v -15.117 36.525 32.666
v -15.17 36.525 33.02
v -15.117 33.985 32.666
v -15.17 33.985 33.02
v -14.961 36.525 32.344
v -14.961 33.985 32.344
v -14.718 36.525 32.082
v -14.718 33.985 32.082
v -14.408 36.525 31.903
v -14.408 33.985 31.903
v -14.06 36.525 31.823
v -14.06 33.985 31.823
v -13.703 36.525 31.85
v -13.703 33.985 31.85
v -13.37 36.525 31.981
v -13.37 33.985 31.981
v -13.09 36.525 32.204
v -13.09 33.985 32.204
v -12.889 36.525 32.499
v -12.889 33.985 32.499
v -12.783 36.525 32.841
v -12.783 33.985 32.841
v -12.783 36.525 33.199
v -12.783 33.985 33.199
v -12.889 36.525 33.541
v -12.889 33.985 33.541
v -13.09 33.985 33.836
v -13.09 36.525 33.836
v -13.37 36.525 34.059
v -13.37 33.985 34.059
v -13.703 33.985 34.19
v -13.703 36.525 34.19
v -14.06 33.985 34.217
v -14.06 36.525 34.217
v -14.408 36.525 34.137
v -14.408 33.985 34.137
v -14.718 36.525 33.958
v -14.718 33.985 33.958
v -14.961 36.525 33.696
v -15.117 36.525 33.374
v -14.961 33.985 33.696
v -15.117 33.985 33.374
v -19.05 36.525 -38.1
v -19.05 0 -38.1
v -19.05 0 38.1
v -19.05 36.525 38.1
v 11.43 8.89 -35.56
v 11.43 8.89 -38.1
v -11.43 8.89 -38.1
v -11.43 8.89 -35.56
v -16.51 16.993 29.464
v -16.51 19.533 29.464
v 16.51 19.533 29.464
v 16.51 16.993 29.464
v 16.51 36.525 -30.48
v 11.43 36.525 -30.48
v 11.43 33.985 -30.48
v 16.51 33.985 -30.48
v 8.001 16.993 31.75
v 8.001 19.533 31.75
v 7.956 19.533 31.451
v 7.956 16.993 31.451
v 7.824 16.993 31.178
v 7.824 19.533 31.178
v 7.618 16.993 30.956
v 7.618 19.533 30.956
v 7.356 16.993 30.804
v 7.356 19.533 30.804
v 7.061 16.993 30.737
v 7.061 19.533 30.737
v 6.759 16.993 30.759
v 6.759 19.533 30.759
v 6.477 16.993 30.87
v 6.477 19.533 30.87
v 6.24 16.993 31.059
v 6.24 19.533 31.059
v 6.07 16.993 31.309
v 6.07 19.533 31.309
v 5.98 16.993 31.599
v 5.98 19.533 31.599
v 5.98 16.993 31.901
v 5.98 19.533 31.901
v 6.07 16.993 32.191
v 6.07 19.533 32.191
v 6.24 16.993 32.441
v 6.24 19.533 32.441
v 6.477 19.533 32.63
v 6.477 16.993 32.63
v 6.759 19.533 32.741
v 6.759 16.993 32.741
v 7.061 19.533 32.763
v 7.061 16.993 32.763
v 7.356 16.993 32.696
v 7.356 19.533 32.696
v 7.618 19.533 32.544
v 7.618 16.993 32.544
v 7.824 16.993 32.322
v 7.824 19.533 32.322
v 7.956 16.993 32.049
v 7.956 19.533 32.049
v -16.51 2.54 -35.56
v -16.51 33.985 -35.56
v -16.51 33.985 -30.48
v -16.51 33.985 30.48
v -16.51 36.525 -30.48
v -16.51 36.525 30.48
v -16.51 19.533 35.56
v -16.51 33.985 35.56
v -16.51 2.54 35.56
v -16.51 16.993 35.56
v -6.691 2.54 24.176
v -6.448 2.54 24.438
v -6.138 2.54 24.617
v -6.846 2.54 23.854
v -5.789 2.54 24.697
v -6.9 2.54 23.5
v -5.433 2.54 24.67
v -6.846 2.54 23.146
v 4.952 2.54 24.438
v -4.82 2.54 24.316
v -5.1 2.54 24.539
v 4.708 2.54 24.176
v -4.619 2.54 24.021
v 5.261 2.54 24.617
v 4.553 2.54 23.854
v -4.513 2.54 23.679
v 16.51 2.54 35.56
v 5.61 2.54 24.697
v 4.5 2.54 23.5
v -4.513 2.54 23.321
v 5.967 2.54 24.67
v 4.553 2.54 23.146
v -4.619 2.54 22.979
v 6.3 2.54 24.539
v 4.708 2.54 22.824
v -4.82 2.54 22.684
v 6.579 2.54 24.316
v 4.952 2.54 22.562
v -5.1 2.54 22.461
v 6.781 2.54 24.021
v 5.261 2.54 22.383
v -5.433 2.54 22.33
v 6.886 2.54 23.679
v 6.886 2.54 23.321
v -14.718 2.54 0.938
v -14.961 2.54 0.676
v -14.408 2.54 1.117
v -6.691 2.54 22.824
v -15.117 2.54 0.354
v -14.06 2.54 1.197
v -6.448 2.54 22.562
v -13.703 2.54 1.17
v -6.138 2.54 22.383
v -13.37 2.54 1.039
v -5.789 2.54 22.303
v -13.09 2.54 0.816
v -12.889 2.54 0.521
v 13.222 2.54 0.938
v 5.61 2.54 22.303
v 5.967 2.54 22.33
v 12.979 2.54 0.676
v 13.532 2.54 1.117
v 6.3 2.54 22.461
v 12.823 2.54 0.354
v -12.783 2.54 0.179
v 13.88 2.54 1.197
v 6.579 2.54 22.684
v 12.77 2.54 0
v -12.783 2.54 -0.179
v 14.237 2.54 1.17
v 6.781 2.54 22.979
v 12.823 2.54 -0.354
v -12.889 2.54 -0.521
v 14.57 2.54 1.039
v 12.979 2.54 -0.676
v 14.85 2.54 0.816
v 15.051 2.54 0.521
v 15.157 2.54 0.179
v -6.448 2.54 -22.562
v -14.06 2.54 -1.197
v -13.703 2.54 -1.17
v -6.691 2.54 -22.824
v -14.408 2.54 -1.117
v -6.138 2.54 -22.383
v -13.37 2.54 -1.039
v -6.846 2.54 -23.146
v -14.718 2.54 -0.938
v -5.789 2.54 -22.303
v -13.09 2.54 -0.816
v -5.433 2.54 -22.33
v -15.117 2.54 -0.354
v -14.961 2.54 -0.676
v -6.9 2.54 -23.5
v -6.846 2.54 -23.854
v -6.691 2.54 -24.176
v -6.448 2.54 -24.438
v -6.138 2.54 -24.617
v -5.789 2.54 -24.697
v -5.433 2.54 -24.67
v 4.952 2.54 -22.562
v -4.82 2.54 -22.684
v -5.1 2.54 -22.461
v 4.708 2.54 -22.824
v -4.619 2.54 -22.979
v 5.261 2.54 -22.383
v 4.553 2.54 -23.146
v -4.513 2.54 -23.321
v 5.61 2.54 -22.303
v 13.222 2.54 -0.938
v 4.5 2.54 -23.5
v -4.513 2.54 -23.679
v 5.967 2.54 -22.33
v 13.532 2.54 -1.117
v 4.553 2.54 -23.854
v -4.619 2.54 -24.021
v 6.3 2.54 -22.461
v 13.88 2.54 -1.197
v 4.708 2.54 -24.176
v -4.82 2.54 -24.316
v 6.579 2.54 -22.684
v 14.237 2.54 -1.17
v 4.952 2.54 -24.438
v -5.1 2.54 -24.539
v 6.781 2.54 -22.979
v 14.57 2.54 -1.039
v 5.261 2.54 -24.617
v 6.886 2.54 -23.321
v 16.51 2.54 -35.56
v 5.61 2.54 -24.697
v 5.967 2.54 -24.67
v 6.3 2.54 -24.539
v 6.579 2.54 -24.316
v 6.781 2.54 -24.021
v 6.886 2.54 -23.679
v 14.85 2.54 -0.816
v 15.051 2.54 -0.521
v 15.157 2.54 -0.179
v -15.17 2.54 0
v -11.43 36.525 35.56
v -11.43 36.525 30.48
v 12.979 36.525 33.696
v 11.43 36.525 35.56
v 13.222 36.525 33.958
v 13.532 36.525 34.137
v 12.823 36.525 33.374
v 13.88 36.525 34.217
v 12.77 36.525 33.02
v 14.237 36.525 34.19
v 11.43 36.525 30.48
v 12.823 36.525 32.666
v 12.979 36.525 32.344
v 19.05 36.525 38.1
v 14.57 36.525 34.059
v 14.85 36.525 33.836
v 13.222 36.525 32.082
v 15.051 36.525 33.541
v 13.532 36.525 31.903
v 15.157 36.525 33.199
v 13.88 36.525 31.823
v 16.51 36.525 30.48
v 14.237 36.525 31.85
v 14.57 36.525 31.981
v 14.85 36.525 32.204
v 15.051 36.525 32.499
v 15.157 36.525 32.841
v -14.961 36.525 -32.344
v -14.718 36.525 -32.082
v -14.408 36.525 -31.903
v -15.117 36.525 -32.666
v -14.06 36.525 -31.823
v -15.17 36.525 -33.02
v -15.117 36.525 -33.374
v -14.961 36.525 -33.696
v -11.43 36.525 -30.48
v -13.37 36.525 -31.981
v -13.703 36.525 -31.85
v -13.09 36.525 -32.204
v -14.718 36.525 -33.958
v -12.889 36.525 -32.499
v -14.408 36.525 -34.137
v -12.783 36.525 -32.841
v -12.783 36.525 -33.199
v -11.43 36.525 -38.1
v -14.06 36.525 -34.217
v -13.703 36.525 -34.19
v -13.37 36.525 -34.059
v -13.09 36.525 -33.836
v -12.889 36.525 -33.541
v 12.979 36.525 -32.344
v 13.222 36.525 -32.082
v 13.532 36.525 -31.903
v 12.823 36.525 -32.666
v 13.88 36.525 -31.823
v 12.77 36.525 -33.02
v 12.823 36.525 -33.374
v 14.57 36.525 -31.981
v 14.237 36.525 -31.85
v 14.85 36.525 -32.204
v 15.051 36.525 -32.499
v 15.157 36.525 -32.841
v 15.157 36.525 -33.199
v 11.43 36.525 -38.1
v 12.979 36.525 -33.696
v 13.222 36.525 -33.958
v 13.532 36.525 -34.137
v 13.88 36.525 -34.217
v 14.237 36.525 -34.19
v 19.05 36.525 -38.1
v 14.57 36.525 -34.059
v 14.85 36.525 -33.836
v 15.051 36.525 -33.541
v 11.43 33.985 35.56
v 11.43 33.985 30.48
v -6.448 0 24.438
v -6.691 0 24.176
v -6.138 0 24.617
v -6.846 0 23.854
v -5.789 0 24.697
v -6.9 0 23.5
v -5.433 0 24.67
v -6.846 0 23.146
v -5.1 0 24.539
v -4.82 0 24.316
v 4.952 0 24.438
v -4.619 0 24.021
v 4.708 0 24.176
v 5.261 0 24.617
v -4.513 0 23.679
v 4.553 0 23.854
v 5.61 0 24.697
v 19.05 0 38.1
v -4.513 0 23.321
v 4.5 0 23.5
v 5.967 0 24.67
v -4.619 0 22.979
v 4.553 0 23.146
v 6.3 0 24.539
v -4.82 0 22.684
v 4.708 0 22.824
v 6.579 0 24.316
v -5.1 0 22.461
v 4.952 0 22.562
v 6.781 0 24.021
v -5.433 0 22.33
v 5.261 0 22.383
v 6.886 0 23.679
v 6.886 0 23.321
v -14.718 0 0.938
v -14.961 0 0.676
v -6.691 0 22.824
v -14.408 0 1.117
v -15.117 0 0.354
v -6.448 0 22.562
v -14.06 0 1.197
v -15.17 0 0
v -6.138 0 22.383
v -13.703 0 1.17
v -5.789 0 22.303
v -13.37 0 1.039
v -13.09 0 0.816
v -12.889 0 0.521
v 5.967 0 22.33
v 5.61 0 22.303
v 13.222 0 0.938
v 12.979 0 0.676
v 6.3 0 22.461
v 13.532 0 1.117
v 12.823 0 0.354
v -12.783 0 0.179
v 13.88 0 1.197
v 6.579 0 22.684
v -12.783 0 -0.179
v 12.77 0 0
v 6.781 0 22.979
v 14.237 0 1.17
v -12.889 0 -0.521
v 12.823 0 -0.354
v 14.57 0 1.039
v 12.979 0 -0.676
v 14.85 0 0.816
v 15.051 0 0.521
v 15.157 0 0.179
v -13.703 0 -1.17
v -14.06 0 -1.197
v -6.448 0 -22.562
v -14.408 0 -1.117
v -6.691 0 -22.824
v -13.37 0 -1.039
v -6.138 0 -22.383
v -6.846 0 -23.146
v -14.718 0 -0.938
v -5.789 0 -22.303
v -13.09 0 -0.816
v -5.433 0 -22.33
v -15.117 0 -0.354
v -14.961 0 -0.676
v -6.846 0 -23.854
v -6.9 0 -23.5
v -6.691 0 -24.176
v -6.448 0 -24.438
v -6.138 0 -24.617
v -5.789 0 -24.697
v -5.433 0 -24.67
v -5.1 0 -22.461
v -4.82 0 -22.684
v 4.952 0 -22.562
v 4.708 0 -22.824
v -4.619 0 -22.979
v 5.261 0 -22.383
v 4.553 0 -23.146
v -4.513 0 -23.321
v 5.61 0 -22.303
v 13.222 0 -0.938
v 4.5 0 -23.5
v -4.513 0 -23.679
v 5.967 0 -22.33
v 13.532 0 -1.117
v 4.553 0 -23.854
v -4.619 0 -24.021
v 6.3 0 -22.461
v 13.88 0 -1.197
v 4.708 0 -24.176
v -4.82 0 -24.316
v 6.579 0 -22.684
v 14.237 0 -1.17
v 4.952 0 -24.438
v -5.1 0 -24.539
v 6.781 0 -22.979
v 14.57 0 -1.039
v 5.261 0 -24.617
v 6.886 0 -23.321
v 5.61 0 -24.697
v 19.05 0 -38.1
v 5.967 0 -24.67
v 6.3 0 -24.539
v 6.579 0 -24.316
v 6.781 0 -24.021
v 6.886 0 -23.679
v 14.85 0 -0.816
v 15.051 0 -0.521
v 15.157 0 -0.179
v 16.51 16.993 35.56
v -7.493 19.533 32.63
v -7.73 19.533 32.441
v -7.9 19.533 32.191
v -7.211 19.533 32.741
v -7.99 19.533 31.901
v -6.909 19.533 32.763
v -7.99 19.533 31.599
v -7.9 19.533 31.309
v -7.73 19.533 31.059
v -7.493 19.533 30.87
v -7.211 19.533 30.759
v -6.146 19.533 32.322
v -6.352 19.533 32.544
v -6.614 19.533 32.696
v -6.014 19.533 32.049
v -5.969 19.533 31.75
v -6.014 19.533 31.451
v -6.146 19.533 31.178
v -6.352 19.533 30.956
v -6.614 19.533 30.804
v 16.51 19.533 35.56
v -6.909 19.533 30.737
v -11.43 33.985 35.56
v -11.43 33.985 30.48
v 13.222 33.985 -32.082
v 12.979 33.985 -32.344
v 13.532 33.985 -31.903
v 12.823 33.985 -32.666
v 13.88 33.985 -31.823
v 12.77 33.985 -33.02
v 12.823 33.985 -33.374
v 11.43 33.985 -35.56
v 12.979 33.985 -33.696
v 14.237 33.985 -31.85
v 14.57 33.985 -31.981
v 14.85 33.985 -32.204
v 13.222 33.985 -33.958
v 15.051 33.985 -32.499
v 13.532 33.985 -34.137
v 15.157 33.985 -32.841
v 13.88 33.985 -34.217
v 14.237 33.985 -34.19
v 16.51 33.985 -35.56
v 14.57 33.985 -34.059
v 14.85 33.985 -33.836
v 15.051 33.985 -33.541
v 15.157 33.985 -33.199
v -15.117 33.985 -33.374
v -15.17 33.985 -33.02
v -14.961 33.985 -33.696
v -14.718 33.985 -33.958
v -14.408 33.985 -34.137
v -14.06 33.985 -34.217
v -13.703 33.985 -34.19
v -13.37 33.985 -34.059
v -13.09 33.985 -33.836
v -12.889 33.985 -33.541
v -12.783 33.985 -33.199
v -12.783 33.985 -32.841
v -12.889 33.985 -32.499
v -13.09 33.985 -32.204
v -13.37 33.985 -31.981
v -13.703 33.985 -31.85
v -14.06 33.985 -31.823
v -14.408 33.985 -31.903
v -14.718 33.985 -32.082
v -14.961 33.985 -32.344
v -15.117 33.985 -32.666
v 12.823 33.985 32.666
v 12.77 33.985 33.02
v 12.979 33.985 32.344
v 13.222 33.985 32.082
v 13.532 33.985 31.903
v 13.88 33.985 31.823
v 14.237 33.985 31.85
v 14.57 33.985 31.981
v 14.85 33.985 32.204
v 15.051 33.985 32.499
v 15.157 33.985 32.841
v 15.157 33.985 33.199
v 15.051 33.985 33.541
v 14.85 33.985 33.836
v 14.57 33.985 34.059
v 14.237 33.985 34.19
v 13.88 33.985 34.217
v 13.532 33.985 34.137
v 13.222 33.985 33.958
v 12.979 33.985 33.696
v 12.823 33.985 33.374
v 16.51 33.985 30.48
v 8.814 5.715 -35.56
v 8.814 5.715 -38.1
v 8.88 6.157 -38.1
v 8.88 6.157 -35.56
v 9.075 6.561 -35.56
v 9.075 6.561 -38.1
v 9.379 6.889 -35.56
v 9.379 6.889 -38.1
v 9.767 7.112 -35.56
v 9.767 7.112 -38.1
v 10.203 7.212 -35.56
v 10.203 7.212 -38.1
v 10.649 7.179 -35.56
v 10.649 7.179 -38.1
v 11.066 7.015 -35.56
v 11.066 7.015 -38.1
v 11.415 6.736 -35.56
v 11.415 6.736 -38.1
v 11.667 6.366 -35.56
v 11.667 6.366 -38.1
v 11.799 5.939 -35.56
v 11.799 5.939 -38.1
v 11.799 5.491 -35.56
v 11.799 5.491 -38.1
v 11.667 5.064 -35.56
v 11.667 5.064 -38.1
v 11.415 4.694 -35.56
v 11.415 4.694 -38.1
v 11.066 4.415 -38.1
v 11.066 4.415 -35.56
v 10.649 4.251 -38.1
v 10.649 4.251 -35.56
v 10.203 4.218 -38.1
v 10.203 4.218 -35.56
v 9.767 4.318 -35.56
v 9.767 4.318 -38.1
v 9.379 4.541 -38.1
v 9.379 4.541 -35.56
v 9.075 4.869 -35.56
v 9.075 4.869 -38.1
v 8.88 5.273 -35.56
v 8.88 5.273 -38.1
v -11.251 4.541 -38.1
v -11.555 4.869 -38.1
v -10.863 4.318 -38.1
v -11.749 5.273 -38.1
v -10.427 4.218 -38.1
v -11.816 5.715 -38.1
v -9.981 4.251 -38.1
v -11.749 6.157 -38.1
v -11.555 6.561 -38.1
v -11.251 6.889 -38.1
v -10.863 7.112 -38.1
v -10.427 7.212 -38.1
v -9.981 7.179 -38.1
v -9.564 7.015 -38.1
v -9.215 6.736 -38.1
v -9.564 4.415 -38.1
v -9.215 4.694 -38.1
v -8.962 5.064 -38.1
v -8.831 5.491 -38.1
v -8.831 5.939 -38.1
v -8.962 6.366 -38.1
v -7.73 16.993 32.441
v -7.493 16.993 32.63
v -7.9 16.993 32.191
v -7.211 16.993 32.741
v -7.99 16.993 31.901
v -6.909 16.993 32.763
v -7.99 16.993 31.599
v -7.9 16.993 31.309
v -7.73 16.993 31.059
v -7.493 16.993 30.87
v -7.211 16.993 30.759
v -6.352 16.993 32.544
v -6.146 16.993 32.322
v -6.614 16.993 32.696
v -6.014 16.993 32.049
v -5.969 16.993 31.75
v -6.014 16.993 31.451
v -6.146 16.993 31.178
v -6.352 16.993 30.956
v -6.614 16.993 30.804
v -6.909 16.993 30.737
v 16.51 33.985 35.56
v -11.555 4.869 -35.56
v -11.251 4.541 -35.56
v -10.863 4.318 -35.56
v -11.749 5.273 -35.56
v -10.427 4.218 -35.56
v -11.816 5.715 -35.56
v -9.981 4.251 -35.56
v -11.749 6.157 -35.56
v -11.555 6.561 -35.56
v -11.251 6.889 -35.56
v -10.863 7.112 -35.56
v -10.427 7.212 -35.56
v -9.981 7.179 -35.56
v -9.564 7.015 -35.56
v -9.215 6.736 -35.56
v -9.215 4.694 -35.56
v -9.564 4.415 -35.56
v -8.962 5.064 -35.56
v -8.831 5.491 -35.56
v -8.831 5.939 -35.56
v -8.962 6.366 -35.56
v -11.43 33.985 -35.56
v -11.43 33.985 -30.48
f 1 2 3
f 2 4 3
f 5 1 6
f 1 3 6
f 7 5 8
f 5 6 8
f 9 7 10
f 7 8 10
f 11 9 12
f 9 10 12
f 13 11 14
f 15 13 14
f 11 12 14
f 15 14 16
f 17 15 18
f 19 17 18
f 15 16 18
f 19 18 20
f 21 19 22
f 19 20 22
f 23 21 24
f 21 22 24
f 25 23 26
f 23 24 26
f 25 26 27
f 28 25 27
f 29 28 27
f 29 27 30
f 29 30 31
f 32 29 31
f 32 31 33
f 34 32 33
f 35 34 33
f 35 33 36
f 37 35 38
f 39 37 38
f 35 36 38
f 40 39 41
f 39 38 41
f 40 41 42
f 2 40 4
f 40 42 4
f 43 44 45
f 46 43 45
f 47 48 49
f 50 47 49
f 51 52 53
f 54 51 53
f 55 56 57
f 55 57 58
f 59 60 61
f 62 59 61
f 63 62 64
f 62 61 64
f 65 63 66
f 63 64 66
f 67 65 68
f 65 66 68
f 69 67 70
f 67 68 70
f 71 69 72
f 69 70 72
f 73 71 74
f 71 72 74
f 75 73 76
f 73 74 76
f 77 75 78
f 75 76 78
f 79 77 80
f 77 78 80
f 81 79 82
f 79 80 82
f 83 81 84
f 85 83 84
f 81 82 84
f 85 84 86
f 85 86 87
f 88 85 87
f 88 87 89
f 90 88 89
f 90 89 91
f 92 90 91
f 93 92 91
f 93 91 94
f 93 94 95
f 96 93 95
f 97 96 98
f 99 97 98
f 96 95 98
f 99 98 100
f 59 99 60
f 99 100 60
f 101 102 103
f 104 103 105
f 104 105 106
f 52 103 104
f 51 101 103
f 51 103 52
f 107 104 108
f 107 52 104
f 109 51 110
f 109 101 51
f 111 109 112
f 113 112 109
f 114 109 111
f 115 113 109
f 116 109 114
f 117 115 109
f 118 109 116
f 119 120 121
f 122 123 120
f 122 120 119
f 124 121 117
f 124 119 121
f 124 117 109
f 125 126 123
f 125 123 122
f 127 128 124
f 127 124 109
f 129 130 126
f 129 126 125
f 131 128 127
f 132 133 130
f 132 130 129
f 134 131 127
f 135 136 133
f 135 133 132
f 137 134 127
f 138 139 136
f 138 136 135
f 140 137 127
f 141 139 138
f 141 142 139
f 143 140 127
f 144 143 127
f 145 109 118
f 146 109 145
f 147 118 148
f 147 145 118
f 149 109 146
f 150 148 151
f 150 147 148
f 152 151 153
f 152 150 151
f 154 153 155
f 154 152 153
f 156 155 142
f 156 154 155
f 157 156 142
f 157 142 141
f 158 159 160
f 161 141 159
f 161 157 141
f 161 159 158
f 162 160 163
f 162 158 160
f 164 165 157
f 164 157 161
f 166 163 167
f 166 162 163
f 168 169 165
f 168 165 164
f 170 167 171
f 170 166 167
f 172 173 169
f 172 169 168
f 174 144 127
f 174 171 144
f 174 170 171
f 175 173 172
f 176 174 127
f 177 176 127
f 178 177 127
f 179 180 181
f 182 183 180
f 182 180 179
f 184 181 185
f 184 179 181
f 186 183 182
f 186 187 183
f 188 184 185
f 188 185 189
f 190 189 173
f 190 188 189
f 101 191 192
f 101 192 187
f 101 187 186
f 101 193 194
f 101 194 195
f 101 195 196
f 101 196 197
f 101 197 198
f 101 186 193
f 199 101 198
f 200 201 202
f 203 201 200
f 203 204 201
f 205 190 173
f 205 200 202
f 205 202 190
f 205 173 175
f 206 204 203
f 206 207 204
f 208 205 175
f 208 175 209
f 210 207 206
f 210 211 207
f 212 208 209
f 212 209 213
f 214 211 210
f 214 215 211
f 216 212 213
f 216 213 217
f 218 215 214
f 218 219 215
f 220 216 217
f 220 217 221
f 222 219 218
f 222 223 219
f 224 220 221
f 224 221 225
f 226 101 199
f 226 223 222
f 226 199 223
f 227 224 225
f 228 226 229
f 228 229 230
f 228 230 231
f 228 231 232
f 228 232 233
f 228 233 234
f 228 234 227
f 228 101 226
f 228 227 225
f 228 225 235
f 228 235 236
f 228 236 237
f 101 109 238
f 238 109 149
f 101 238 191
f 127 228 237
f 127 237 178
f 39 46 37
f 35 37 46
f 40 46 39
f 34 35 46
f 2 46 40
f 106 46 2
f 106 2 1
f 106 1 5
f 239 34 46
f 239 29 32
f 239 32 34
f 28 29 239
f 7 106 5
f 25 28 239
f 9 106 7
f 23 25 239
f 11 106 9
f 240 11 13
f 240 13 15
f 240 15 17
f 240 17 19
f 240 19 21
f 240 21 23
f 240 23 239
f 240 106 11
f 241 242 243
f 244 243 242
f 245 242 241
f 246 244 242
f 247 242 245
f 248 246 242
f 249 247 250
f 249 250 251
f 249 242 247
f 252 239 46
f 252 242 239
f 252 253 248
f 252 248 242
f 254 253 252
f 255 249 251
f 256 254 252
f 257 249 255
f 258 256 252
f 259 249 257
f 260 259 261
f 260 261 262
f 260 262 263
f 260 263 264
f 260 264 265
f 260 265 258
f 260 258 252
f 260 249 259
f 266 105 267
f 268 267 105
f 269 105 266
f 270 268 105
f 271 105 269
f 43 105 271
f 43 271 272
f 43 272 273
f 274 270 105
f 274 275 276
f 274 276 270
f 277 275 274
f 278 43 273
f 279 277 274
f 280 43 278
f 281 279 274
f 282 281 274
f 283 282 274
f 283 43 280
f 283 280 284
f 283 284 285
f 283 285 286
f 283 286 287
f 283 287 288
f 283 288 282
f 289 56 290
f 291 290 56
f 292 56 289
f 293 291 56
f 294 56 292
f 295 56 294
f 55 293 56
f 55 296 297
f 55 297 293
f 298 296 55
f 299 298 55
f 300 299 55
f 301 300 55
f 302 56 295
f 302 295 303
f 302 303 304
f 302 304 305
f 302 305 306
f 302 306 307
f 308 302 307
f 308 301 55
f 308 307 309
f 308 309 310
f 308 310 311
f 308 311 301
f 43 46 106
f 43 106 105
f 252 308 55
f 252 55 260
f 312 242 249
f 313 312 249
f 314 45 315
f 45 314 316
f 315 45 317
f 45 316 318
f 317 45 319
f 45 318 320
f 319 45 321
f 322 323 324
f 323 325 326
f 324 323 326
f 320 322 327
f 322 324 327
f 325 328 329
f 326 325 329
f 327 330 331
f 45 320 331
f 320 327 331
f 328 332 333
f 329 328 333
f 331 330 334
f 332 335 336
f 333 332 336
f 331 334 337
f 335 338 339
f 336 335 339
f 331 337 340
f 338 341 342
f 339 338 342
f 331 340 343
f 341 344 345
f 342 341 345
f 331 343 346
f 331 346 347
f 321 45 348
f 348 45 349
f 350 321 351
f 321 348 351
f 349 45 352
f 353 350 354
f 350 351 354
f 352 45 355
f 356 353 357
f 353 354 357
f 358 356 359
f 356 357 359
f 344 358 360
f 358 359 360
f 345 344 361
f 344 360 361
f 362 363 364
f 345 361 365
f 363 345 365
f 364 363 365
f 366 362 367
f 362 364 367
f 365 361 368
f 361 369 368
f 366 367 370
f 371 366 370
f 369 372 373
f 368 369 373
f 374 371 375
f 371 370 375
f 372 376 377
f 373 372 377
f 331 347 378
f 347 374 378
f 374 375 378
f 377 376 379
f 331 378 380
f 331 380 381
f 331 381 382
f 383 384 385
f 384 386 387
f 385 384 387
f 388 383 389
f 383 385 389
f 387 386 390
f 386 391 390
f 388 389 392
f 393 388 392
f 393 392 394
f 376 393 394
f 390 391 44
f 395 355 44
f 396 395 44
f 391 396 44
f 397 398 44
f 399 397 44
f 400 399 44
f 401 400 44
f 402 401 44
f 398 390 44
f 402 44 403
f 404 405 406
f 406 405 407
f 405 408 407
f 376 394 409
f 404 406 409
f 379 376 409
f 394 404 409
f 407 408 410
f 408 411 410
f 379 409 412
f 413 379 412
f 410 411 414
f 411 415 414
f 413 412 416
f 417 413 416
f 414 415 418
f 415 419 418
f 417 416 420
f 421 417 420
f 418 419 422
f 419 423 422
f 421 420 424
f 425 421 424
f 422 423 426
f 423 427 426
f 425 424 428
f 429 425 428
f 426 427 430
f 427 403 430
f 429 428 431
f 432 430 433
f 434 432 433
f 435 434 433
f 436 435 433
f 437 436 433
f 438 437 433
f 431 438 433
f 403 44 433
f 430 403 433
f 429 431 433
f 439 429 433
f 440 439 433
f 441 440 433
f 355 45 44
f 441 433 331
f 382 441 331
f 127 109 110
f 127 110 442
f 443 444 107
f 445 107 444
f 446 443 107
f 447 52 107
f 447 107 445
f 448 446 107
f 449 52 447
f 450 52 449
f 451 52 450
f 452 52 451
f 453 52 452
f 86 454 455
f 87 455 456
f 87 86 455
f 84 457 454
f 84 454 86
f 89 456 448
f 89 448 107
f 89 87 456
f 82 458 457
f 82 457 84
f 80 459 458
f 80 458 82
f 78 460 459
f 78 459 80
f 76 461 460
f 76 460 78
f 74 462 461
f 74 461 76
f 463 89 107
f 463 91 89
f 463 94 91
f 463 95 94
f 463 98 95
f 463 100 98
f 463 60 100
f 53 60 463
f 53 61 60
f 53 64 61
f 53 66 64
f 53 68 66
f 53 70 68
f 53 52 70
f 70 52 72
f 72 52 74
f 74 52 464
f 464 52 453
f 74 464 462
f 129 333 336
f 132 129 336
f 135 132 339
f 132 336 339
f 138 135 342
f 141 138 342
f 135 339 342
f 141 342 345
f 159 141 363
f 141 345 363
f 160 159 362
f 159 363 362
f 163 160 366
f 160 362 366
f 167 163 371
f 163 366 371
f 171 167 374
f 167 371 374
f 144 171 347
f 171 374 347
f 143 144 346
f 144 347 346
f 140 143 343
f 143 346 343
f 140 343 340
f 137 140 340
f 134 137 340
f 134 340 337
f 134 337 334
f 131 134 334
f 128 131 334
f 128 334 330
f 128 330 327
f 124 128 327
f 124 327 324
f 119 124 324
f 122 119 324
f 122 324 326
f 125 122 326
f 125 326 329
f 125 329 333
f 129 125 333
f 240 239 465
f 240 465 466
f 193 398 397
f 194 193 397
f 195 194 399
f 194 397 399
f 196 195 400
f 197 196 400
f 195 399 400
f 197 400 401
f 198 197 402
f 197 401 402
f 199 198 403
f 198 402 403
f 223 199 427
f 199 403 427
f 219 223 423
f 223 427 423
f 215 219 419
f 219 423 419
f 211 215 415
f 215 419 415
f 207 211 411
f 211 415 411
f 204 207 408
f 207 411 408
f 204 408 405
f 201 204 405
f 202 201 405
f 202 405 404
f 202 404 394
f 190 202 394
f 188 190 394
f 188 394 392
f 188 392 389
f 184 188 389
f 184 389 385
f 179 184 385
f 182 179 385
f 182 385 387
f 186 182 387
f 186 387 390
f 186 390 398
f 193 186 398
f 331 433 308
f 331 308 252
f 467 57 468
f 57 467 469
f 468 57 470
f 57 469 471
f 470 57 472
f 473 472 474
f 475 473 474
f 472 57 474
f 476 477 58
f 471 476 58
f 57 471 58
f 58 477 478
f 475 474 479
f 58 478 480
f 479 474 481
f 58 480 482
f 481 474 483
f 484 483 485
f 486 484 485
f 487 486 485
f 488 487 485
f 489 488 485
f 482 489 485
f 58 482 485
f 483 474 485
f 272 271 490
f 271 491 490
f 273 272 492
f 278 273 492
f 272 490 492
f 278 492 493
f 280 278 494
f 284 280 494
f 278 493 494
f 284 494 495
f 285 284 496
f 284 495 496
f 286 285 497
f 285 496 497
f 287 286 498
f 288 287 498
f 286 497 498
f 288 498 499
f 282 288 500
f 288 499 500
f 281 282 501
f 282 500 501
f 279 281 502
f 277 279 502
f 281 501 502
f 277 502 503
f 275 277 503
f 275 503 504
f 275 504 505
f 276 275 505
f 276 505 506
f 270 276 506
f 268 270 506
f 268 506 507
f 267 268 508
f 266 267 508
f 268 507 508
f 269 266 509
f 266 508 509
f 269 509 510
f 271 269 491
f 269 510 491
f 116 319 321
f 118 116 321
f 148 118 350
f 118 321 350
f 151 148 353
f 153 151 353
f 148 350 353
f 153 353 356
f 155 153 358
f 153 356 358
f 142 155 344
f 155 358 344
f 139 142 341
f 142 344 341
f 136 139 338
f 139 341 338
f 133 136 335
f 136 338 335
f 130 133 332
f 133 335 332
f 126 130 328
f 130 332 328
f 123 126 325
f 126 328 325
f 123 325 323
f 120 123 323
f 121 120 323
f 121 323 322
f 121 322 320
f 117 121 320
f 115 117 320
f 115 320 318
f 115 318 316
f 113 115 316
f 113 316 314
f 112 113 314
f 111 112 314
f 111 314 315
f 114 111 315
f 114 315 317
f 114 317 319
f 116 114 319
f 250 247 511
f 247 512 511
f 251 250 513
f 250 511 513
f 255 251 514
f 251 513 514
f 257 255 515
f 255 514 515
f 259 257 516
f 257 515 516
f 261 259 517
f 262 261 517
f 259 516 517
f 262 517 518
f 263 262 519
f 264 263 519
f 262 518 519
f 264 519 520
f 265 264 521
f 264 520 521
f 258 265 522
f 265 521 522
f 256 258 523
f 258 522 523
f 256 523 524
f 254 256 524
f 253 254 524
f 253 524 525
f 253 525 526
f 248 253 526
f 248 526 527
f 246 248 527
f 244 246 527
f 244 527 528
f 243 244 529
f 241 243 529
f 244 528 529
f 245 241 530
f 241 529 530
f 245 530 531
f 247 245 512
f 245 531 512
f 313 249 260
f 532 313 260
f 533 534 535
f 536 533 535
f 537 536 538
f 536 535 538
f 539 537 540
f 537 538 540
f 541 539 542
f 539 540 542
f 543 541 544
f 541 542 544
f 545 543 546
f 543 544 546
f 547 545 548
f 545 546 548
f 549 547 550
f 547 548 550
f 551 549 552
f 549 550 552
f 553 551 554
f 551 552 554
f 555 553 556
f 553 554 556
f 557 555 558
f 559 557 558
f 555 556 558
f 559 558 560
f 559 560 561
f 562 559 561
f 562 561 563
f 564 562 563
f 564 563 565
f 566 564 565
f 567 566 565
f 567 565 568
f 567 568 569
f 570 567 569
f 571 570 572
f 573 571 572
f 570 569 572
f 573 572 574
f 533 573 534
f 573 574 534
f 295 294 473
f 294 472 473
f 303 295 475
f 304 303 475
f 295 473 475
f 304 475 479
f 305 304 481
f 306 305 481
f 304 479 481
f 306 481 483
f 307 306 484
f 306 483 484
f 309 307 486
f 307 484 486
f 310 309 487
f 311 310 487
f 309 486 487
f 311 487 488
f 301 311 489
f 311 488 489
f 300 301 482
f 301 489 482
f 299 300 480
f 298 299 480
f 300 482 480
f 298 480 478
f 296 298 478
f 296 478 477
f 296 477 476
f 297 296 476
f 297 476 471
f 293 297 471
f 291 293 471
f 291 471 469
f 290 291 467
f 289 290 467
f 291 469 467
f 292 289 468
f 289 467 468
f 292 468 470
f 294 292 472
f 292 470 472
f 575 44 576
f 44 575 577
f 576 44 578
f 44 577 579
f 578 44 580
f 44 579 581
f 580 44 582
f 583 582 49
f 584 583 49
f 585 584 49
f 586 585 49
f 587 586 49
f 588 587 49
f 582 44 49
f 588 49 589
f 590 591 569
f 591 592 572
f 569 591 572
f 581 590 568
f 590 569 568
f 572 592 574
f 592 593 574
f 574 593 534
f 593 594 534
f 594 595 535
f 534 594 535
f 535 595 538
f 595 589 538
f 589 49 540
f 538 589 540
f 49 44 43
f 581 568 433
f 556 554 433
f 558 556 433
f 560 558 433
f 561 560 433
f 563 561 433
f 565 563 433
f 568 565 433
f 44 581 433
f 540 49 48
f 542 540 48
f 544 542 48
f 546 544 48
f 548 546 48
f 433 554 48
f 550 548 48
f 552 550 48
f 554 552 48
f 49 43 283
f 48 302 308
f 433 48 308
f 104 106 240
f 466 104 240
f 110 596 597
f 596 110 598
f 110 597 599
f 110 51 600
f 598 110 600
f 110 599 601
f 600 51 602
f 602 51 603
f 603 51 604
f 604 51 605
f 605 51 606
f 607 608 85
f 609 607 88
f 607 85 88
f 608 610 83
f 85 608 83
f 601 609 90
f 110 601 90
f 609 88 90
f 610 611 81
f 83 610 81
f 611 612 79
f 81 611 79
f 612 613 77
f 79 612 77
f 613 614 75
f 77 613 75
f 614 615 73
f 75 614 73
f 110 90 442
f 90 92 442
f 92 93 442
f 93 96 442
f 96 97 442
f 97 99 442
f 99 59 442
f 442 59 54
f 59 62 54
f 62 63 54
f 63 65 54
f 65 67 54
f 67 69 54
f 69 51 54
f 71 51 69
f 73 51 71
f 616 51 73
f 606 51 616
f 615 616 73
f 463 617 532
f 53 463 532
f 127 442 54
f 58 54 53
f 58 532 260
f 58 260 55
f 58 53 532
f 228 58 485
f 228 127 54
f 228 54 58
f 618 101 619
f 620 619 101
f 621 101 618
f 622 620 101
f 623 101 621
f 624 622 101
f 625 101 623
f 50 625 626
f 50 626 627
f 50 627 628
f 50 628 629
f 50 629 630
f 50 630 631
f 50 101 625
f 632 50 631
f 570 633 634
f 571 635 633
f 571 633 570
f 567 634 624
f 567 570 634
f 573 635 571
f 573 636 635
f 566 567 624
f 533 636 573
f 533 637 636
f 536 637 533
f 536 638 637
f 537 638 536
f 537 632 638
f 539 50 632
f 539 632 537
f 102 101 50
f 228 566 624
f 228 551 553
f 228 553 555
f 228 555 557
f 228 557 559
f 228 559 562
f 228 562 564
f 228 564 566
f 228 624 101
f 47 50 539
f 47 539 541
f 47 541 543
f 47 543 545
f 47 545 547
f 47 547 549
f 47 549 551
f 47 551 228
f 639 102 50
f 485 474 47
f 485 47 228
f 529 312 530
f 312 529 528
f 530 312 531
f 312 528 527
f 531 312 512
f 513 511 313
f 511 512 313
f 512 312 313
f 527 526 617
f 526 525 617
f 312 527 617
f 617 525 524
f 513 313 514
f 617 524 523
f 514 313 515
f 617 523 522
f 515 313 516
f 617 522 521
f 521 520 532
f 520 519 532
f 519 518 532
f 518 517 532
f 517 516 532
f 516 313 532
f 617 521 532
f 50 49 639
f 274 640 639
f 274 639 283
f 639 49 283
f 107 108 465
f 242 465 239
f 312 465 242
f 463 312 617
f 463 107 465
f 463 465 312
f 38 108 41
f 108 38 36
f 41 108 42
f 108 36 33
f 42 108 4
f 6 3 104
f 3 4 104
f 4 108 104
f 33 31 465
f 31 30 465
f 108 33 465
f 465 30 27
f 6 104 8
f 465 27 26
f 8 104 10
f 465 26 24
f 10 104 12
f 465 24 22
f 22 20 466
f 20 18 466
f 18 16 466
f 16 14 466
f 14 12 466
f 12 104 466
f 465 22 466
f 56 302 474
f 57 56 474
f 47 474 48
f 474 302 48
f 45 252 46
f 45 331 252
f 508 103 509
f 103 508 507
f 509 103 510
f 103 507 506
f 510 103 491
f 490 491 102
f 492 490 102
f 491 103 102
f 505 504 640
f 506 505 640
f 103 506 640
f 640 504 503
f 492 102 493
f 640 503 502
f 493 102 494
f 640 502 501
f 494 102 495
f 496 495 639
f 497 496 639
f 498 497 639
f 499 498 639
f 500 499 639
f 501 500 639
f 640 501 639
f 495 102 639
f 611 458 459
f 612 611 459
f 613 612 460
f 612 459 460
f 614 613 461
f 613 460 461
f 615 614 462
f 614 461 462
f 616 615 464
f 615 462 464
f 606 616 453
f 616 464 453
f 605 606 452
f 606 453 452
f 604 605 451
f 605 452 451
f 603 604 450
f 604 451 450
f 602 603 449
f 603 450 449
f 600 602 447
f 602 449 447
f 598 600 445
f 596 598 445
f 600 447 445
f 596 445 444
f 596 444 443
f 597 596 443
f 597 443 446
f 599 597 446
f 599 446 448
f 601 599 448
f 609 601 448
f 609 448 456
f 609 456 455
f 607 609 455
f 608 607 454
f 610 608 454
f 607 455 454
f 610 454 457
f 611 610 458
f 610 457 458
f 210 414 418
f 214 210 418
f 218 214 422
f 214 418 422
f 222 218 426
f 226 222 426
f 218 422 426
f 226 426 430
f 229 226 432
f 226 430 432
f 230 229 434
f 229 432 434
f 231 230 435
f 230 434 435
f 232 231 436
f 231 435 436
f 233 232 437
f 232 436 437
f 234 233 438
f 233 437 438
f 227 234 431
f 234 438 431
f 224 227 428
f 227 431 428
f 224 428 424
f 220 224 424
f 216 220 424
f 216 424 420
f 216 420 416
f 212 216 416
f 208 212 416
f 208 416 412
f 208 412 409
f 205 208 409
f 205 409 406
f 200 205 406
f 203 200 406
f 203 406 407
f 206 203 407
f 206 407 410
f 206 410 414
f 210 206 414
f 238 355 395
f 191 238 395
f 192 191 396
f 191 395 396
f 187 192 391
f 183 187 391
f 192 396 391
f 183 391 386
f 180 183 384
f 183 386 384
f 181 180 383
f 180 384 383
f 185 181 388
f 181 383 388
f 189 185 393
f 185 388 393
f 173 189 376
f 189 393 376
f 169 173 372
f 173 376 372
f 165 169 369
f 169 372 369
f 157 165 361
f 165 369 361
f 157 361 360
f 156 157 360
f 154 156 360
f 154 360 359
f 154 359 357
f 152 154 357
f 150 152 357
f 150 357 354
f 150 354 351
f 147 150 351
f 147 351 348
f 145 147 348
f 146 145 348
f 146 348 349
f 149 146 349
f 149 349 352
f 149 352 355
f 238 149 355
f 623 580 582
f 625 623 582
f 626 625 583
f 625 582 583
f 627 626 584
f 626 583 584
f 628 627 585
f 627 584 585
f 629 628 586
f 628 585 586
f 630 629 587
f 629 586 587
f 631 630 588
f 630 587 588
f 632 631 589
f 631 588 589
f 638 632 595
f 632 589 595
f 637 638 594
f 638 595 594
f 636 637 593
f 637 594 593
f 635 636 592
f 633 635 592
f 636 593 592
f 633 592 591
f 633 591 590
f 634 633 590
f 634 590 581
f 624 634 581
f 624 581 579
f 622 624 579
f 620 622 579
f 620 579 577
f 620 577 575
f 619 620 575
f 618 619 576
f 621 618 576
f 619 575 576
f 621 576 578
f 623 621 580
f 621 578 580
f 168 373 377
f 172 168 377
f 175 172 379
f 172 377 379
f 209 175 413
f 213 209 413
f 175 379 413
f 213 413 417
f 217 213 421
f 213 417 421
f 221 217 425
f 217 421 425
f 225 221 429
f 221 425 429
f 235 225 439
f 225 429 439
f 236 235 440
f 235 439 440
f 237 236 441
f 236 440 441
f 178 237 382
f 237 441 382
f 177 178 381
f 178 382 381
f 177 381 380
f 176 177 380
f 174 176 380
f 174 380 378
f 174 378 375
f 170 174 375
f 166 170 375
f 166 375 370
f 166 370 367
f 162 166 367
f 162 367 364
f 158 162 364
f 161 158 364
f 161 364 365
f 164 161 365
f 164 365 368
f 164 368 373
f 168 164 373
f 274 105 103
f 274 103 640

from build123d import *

# Parameters (mm, degrees)
SKETCH1_W                     = 38.1
SKETCH1_H                     = 76.2
BOSS_EXTRUDE1_DEPTH           = 2.54
M2_CLEARANCE_HOLE1_TO_DRONE_D = 2.4
M2_CLEARANCE_HOLE2_TO_PI_D    = 2.4
BOSS_EXTRUDE2_DEPTH           = 33.9852
SKETCH9_R                     = 1.50114
BOSS_EXTRUDE4_DEPTH           = 2.54
SKETCH11_W                    = 33.02
SKETCH11_H                    = 6.096
SKETCH11_R                    = 1.016
BOSS_EXTRUDE6_DEPTH           = 2.54
SKETCH12_W                    = 5.08
SKETCH12_H                    = 5.08
BOSS_EXTRUDE7_DEPTH           = 2.54
M2_CLEARANCE_HOLE1_D          = 2.4
M2_CLEARANCE_HOLE1_DEPTH      = 2.54
M2_CLEARANCE_HOLE1_TIP        = 0.721032743


with BuildPart() as part:
    # Sketch1 → Boss-Extrude1 (new body)
    with BuildSketch(Plane(origin=(0, 0, 0), x_dir=(1, 0, 0), z_dir=(0, 1, 0))):
        Rectangle(SKETCH1_W, SKETCH1_H)
    extrude(amount=BOSS_EXTRUDE1_DEPTH)

    # M2 Clearance Hole1 - to drone (through all)
    with Locations(Plane(origin=(0, 2.54, 0), x_dir=(1, 0, 0), z_dir=(0, 1, 0))):
        with Locations((-13.97, 0), (13.97, 0)):
            Hole(M2_CLEARANCE_HOLE1_TO_DRONE_D / 2)

    # M2 Clearance Hole2 - to Pi (through all)
    with Locations(Plane(origin=(0, 2.54, 0), x_dir=(1, 0, 0), z_dir=(0, 1, 0))):
        with Locations((-5.69976, 23.50008), (5.69976, 23.50008), (5.69976, -23.50008), (-5.69976, -23.50008)):
            Hole(M2_CLEARANCE_HOLE2_TO_PI_D / 2)

    # Sketch7 → Boss-Extrude2 (add)
    with BuildSketch(Plane(origin=(0, 2.54, 0), x_dir=(1, 0, 0), z_dir=(0, 1, 0))):
        Polygon((-19.05, -38.1), (-19.05, -35.56), (-19.05, 38.1), (-16.51, 38.1), (-16.51, -35.56), (16.51, -35.56), (16.51, 38.1), (19.05, 38.1), (19.05, -38.1), align=None)
    extrude(amount=BOSS_EXTRUDE2_DEPTH)

    # Sketch11 → Boss-Extrude6 (add)
    with BuildSketch(Plane(origin=(0, 19.5326, 0), x_dir=(1, 0, 0), z_dir=(0, 1, 0))):
        with Locations((0, -32.512)):
            Rectangle(SKETCH11_W, SKETCH11_H)
        with Locations((-6.985, -31.75)):
            Circle(SKETCH11_R, mode=Mode.SUBTRACT)
        with Locations((6.985, -31.75)):
            Circle(SKETCH11_R, mode=Mode.SUBTRACT)
    extrude(amount=-BOSS_EXTRUDE6_DEPTH)



with BuildPart() as body_2:
    # Sketch9 → Boss-Extrude4 (new body)
    with BuildSketch(Plane(origin=(0, 0, -38.1), x_dir=(-1, 0, 0), z_dir=(0, 0, -1))):
        Polygon((-11.43, 8.89), (11.43, 8.89), (11.43, 36.5252), (16.51, 36.5252), (16.51, 2.54), (-16.51, 2.54), (-16.51, 36.5252), (-11.43, 36.5252), align=None)
        with Locations((-10.31494, 5.715)):
            Circle(SKETCH9_R, mode=Mode.SUBTRACT)
        with Locations((10.31494, 5.715)):
            Circle(SKETCH9_R, mode=Mode.SUBTRACT)
    extrude(amount=-BOSS_EXTRUDE4_DEPTH)


with BuildPart() as part_1:
    add(part.part)

    add(body_2.part)  # Boss-Extrude7 merges body 2
    # Sketch12 → Boss-Extrude7 (add)
    with BuildSketch(Plane(origin=(0, 36.5252, 0), x_dir=(1, 0, 0), z_dir=(0, 1, 0))):
        with Locations((-13.97, -33.02)):
            Rectangle(SKETCH12_W, SKETCH12_H)
        with Locations((13.97, -33.02)):
            Rectangle(SKETCH12_W, SKETCH12_H)
        with Locations((13.97, 33.02)):
            Rectangle(SKETCH12_W, SKETCH12_H)
        with Locations((-13.97, 33.02)):
            Rectangle(SKETCH12_W, SKETCH12_H)
    extrude(amount=-BOSS_EXTRUDE7_DEPTH)

    # M2 Clearance Hole1
    with Locations(Plane(origin=(0, 36.5252, 0), x_dir=(1, 0, 0), z_dir=(0, 1, 0))):
        with Locations((-13.97, 33.02), (13.97, 33.02), (13.97, -33.02), (-13.97, -33.02)):
            Hole(M2_CLEARANCE_HOLE1_D / 2, depth=M2_CLEARANCE_HOLE1_DEPTH)
            with Locations((0, 0, -(M2_CLEARANCE_HOLE1_DEPTH + M2_CLEARANCE_HOLE1_TIP / 2))):  # 118° drill point
                Cone(0, M2_CLEARANCE_HOLE1_D / 2, M2_CLEARANCE_HOLE1_TIP, mode=Mode.SUBTRACT)


solid = part_1.part
